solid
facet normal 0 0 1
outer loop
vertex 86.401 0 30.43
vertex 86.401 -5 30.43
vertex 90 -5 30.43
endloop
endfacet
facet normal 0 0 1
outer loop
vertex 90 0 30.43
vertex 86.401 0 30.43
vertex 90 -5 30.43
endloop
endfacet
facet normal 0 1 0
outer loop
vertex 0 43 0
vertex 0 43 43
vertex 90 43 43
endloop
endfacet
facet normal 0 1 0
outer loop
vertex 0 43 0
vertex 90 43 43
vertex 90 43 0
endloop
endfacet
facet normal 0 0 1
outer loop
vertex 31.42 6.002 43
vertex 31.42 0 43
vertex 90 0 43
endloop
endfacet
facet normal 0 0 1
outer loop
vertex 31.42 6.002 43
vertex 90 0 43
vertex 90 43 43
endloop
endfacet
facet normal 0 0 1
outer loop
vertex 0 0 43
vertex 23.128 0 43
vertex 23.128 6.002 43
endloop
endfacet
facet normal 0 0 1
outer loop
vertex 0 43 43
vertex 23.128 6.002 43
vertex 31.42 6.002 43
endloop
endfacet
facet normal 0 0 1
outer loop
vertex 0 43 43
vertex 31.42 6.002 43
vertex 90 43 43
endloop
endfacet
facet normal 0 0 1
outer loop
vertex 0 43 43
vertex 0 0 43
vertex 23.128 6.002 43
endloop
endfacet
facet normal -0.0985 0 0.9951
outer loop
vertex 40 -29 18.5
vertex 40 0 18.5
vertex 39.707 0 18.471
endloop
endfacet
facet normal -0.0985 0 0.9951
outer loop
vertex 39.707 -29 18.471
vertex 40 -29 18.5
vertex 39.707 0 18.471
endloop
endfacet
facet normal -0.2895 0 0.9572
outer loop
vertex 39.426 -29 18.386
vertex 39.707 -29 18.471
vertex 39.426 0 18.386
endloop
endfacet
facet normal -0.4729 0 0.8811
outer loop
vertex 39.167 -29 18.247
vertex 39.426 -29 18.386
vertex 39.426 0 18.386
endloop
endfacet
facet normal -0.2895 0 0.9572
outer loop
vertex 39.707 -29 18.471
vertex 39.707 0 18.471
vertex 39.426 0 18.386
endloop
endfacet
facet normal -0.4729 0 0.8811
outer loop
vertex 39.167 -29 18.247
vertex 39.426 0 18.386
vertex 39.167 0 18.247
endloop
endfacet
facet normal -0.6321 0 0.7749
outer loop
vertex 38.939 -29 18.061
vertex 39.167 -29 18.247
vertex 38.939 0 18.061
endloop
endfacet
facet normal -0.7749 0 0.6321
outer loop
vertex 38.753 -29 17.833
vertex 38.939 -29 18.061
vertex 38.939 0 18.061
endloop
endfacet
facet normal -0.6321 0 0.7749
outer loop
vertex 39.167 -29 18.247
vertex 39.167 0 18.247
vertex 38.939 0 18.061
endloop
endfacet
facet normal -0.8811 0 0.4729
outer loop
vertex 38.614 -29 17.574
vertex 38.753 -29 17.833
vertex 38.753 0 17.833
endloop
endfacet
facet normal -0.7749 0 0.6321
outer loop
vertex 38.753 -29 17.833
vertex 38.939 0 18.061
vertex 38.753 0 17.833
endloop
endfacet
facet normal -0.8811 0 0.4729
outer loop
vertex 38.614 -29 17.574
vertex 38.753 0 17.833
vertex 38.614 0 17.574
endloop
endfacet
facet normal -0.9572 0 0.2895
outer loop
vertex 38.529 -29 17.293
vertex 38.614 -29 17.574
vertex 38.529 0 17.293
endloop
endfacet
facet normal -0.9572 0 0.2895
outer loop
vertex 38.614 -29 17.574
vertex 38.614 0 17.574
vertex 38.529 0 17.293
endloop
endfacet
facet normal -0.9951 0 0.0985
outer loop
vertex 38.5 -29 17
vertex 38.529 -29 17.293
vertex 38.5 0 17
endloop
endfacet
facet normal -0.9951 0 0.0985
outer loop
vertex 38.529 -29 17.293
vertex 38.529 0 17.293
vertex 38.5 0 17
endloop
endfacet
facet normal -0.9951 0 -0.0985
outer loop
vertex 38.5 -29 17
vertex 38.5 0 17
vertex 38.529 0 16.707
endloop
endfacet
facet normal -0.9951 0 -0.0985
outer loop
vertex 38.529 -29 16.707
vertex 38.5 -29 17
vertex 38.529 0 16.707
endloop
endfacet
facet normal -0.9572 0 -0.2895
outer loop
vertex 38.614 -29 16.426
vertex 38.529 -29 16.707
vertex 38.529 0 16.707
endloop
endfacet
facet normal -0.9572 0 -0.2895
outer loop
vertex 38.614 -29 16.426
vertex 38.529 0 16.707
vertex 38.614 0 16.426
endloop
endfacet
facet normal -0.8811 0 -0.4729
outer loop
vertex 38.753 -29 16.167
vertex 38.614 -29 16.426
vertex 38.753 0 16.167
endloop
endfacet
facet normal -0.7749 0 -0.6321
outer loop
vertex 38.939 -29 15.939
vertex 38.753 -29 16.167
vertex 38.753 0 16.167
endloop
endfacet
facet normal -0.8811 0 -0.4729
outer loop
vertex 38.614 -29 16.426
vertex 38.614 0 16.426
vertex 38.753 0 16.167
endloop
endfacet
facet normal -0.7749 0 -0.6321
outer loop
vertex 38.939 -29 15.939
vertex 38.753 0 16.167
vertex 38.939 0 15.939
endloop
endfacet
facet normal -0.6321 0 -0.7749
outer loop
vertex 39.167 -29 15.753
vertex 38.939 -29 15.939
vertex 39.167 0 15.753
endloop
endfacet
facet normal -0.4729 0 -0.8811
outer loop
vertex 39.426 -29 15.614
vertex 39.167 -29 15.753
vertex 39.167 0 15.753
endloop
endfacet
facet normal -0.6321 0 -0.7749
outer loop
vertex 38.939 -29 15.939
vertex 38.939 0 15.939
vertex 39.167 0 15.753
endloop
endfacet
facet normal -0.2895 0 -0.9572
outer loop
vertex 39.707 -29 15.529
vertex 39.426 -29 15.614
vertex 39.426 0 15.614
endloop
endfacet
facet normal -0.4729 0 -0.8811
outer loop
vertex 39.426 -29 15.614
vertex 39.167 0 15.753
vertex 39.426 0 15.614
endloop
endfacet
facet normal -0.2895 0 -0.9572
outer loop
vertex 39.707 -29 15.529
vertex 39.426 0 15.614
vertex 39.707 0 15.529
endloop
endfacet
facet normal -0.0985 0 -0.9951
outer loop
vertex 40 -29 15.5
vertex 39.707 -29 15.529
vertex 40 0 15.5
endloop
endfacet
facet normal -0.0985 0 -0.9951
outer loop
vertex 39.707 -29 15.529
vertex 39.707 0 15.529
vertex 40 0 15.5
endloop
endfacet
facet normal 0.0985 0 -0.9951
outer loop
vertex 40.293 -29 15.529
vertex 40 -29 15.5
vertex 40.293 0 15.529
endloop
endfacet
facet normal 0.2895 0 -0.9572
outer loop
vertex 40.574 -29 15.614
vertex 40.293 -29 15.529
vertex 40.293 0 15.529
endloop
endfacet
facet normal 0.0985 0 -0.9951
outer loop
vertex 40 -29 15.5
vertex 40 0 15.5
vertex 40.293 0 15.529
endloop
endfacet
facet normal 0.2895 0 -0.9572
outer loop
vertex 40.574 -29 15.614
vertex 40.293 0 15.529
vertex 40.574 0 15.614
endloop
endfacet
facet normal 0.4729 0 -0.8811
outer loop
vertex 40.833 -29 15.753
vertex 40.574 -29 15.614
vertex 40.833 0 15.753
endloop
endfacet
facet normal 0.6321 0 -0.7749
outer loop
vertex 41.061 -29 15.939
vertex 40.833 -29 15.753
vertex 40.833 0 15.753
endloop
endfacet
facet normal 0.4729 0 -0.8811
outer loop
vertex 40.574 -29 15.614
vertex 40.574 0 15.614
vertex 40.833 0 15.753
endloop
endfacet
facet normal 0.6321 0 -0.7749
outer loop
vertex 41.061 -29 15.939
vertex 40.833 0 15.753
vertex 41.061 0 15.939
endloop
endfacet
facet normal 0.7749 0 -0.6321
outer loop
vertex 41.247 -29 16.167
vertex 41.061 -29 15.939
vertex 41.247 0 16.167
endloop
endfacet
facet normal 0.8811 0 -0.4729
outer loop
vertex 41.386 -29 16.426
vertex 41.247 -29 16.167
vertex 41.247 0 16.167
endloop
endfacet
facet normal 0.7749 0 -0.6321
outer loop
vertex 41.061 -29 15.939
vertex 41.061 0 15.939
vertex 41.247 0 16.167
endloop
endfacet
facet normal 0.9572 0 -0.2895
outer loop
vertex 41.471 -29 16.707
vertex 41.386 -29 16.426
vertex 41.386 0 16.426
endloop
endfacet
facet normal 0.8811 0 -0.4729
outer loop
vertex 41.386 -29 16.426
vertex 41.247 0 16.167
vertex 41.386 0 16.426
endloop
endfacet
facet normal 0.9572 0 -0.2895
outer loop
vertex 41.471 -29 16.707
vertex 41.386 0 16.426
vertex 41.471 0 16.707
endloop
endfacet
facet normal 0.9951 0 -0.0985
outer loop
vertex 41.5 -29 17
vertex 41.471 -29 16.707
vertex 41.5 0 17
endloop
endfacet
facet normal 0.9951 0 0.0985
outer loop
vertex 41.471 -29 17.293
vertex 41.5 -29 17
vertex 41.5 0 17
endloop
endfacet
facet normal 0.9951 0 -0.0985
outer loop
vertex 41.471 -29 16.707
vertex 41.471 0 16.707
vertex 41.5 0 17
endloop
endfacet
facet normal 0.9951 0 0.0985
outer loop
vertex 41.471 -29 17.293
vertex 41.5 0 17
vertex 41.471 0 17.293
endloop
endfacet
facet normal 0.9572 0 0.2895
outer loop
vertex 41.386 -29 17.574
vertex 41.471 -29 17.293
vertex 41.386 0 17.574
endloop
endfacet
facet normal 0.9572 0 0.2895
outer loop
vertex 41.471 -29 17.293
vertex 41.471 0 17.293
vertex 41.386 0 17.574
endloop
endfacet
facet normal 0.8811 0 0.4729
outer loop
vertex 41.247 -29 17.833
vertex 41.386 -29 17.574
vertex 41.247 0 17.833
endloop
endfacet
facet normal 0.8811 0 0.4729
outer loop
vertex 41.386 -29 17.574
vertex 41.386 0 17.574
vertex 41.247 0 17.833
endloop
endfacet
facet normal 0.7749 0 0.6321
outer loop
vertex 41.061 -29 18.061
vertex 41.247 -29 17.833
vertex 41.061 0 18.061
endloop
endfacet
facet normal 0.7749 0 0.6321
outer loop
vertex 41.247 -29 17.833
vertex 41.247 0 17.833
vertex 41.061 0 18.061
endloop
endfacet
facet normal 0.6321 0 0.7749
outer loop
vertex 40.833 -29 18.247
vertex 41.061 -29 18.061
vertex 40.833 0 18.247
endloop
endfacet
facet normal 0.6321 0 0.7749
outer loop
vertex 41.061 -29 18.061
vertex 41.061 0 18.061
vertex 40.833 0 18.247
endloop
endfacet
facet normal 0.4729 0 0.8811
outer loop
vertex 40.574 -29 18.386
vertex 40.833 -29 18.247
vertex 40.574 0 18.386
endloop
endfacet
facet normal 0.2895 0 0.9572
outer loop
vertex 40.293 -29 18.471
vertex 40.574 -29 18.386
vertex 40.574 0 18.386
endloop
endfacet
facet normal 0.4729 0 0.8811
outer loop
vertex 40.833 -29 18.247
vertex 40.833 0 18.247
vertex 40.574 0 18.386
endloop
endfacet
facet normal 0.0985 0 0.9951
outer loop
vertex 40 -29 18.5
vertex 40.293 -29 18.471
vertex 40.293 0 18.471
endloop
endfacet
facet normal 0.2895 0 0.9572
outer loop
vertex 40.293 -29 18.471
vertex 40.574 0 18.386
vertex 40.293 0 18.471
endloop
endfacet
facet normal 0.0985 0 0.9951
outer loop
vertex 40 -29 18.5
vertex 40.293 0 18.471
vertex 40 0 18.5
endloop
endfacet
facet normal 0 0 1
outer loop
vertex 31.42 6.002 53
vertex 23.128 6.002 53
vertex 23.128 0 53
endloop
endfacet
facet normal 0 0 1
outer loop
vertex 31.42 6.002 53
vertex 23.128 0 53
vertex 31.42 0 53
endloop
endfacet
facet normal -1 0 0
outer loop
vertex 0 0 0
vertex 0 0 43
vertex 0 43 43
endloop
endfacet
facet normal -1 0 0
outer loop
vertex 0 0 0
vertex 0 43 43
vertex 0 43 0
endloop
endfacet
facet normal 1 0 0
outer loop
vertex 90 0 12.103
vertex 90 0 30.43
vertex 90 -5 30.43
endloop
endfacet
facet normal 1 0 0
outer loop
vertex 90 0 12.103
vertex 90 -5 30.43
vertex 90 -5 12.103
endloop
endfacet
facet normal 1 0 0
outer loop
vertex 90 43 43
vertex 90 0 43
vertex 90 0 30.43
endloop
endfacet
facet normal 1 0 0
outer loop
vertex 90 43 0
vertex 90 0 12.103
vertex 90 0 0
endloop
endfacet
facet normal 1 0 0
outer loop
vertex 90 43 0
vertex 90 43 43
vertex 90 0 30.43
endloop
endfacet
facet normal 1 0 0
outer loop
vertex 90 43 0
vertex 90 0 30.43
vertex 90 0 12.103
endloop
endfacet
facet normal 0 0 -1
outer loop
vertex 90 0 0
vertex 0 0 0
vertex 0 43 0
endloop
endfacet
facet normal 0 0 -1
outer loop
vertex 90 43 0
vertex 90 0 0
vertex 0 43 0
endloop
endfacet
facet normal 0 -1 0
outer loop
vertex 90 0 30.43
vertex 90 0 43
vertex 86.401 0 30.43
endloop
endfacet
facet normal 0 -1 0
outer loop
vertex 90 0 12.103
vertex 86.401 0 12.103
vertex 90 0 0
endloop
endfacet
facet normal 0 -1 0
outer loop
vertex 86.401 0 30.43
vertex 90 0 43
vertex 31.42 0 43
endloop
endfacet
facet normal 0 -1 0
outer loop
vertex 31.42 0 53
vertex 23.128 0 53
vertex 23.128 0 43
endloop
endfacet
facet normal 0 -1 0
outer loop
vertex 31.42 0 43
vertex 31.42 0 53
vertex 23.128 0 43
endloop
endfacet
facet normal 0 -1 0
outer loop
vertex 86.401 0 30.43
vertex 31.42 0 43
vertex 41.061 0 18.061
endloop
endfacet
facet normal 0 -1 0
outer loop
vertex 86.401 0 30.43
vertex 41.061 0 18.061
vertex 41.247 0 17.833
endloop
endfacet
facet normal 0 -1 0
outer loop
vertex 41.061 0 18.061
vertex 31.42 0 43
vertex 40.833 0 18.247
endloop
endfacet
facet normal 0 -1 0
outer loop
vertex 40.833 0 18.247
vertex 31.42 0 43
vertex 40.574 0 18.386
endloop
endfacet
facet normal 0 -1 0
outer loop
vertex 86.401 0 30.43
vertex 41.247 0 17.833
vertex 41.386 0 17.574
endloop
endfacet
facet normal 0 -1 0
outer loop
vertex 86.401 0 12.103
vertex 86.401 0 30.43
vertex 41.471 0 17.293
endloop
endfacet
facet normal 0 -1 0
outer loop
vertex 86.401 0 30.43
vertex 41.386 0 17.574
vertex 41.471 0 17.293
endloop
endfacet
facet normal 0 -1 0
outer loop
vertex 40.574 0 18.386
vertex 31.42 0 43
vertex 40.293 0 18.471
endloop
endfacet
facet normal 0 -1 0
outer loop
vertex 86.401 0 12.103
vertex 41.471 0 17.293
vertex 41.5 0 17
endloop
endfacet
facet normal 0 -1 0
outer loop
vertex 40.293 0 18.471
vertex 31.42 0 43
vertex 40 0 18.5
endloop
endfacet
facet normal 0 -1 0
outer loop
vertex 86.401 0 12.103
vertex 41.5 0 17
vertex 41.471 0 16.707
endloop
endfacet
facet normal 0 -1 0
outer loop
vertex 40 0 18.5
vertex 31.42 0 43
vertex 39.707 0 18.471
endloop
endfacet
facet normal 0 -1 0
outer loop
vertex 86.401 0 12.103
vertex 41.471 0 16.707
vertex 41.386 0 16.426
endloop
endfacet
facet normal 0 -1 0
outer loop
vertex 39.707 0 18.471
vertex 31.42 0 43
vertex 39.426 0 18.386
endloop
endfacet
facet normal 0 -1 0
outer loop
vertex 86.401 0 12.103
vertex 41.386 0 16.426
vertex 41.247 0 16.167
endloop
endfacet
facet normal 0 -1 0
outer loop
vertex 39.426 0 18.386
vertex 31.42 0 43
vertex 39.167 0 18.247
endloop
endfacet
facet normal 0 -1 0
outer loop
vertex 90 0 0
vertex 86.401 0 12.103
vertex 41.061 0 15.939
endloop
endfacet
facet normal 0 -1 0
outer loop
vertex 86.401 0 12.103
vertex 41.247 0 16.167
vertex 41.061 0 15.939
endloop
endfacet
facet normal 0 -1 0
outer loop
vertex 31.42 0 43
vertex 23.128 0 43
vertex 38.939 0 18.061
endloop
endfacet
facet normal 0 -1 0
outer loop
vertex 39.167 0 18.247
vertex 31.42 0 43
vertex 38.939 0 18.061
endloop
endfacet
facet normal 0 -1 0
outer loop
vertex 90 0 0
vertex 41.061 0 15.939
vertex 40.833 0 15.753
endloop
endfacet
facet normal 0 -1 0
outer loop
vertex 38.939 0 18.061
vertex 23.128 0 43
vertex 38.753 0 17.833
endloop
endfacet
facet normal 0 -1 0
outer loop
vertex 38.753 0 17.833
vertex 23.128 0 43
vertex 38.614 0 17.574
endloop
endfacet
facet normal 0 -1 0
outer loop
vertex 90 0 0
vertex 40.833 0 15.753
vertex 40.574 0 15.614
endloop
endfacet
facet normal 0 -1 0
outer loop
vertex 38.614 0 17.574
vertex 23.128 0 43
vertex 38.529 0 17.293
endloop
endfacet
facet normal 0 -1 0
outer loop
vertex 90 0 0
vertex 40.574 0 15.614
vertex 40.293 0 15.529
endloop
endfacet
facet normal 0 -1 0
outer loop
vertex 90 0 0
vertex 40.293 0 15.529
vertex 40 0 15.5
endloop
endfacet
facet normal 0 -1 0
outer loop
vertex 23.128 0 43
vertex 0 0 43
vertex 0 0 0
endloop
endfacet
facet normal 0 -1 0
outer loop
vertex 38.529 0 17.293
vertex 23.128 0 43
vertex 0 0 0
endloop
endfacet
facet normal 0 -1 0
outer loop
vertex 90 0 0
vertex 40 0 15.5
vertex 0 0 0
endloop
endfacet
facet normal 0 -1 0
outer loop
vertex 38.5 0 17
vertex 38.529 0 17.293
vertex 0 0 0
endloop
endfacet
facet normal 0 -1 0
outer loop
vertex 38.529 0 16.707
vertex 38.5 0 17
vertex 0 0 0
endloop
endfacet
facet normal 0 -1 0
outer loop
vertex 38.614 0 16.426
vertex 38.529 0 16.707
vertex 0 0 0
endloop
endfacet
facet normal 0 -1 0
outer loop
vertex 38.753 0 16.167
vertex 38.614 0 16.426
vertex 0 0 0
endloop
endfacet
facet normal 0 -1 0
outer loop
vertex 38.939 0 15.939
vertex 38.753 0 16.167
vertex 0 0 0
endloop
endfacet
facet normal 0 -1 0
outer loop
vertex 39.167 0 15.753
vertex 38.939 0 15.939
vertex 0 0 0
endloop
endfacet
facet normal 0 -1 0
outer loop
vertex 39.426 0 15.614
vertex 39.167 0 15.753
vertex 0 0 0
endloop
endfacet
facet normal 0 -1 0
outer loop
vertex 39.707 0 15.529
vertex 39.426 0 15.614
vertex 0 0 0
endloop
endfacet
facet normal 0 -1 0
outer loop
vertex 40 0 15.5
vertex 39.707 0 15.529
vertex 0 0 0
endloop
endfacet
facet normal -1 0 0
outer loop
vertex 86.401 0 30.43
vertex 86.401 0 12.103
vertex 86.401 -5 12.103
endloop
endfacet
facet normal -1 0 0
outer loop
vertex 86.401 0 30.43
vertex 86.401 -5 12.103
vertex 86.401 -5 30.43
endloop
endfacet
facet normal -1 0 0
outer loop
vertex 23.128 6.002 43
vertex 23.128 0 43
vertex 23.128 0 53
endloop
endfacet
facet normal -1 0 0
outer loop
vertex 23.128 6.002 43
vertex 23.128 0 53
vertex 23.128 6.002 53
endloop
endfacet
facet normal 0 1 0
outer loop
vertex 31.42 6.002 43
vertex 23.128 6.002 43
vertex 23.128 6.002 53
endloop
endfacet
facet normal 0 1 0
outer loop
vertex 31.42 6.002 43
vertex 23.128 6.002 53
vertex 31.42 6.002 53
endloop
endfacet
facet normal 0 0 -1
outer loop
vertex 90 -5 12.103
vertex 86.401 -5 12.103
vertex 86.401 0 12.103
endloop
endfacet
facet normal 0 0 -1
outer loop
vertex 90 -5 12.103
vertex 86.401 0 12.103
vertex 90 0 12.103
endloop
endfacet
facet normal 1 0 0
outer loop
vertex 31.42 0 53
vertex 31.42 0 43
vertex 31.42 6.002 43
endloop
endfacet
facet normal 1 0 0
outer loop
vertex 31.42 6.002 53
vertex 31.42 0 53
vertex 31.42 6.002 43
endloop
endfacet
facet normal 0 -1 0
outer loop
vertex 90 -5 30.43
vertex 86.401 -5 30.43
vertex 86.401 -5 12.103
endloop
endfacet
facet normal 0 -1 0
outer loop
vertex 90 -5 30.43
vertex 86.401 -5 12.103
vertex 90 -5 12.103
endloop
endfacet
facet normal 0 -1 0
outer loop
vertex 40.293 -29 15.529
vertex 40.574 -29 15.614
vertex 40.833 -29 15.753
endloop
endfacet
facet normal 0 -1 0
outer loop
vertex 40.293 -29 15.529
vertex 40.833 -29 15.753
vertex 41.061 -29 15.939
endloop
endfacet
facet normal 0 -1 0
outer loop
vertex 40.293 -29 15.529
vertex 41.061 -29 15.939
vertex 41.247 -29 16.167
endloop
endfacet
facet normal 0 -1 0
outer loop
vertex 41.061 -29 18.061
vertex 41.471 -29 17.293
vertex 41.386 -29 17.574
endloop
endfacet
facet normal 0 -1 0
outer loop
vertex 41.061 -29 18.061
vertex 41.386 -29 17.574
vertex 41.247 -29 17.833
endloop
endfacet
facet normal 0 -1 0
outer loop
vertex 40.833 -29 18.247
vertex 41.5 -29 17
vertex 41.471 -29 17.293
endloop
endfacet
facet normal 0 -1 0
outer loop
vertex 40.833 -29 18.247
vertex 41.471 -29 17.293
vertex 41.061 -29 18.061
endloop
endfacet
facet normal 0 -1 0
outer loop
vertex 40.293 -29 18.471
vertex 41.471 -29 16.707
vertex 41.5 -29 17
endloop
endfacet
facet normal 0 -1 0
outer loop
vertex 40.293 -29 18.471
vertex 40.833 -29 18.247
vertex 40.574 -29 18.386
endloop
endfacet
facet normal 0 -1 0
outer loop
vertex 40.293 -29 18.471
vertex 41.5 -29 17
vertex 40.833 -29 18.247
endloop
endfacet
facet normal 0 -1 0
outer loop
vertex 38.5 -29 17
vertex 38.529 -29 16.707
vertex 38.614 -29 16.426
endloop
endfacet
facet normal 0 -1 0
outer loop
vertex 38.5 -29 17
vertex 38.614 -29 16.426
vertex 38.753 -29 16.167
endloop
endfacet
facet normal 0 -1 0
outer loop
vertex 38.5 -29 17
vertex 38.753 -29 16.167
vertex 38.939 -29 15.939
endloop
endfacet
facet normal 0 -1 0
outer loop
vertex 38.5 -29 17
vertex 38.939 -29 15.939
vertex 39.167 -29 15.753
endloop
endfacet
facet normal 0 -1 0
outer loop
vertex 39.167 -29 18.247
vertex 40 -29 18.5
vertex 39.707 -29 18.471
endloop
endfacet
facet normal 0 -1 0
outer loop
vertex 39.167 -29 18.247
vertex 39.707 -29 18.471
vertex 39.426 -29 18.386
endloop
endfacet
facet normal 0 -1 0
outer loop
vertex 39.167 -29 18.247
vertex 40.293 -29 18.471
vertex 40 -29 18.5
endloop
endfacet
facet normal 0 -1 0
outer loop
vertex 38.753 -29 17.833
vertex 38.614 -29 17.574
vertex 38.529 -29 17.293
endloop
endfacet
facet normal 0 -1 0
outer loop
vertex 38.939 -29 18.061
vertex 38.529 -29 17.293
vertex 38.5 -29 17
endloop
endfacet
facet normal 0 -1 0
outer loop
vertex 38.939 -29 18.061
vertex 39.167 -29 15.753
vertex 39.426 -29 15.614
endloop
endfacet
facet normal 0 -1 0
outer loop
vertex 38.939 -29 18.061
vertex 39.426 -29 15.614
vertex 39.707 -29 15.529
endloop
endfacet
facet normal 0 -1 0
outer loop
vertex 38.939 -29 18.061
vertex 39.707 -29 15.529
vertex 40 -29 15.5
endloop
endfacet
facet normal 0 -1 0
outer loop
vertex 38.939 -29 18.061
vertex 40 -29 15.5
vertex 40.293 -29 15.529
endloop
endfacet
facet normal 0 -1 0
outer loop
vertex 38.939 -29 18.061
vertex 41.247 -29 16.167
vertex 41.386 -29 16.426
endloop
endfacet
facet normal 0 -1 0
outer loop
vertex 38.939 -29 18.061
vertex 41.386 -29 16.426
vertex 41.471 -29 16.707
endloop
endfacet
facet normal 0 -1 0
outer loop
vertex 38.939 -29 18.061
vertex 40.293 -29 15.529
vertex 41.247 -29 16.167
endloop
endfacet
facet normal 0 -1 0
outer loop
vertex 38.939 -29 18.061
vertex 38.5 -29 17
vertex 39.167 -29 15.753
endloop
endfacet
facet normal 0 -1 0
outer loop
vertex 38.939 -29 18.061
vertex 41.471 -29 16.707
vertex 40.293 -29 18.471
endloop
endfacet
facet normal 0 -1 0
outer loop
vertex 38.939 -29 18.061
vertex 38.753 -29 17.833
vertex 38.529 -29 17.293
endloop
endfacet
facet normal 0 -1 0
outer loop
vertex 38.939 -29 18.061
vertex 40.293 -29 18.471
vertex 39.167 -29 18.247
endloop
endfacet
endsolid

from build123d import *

# Parameters (mm, degrees)
SKETCH_1_W      = 43
SKETCH_1_H      = 43
EXTRUDE_1_DEPTH = 90
SKETCH_2_R      = 1.5
EXTRUDE_2_DEPTH = 29
SKETCH_3_W      = 3.599409295
SKETCH_3_H      = 18.326935395
EXTRUDE_3_DEPTH = 5
SKETCH_4_W      = 8.291811564
SKETCH_4_H      = 6.001856053
EXTRUDE_4_DEPTH = 10


with BuildPart() as part:
    # 草图1 → 凸台-拉伸1 (new body)
    with BuildSketch(Plane(origin=(0, 0, 0), x_dir=(0, 0, -1), z_dir=(1, 0, 0))):
        with Locations((-21.5, 21.5)):
            Rectangle(SKETCH_1_W, SKETCH_1_H)
    extrude(amount=EXTRUDE_1_DEPTH)

    # 草图2 → 凸台-拉伸2 (add)
    with BuildSketch(Plane.XZ):
        with Locations(Location((40, 17, 0), (0, 0, 90))):
            Circle(SKETCH_2_R)
    extrude(amount=EXTRUDE_2_DEPTH)

    # 草图3 → 凸台-拉伸3 (add)
    with BuildSketch(Plane.XZ):
        with Locations((88.200295353, 21.266426497)):
            Rectangle(SKETCH_3_W, SKETCH_3_H)
    extrude(amount=EXTRUDE_3_DEPTH)

    # 草图4 → 凸台-拉伸4 (add)
    with BuildSketch(Plane.XY.offset(43)):
        with Locations((27.274280527, 3.000928027)):
            Rectangle(SKETCH_4_W, SKETCH_4_H)
    extrude(amount=EXTRUDE_4_DEPTH)


solid = part.part
